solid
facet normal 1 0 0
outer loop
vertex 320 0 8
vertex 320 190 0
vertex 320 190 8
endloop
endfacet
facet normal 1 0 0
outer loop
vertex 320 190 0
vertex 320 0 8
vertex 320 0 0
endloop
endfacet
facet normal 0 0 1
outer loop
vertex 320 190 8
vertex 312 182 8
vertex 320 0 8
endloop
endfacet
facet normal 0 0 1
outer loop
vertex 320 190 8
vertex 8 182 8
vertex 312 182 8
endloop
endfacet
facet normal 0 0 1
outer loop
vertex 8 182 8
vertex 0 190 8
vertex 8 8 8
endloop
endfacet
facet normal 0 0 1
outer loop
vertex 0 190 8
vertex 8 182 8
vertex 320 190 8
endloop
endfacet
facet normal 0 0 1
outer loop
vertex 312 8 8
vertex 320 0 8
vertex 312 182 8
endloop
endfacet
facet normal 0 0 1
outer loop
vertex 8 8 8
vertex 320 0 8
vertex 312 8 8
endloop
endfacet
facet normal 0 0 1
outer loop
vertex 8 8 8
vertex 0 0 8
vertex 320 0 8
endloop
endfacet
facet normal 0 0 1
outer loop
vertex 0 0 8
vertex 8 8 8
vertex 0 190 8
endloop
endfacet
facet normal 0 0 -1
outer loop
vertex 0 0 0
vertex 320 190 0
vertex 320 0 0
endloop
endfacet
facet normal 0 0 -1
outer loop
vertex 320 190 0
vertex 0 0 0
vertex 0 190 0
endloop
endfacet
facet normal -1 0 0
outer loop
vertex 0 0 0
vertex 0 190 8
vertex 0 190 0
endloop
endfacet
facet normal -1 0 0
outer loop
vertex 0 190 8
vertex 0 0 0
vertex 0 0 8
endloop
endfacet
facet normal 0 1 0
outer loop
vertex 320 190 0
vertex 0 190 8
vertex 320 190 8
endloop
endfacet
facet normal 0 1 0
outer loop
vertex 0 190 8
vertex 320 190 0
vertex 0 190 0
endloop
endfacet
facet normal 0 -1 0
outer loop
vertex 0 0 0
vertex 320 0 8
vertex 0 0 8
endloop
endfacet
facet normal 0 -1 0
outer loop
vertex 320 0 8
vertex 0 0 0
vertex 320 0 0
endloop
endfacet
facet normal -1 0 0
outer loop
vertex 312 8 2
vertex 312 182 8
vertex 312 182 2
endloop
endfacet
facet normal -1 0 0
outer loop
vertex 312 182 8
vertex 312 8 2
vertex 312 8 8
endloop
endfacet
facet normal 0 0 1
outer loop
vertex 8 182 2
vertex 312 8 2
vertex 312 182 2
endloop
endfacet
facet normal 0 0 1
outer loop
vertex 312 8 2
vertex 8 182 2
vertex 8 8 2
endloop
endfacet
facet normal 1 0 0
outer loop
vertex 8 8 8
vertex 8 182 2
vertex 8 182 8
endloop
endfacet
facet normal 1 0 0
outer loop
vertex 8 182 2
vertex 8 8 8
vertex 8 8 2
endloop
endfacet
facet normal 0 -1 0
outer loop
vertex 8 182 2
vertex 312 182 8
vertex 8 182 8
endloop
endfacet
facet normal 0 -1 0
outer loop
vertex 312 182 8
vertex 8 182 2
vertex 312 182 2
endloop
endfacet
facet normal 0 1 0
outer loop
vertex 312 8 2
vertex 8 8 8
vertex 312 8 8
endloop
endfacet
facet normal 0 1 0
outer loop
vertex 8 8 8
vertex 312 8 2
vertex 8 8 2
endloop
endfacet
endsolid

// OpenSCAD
// Concept only. Provisional dimensions in mm.
$fn=32;
difference(){cube([320,190,8]);translate([8,8,2])cube([304,174,8]);}
